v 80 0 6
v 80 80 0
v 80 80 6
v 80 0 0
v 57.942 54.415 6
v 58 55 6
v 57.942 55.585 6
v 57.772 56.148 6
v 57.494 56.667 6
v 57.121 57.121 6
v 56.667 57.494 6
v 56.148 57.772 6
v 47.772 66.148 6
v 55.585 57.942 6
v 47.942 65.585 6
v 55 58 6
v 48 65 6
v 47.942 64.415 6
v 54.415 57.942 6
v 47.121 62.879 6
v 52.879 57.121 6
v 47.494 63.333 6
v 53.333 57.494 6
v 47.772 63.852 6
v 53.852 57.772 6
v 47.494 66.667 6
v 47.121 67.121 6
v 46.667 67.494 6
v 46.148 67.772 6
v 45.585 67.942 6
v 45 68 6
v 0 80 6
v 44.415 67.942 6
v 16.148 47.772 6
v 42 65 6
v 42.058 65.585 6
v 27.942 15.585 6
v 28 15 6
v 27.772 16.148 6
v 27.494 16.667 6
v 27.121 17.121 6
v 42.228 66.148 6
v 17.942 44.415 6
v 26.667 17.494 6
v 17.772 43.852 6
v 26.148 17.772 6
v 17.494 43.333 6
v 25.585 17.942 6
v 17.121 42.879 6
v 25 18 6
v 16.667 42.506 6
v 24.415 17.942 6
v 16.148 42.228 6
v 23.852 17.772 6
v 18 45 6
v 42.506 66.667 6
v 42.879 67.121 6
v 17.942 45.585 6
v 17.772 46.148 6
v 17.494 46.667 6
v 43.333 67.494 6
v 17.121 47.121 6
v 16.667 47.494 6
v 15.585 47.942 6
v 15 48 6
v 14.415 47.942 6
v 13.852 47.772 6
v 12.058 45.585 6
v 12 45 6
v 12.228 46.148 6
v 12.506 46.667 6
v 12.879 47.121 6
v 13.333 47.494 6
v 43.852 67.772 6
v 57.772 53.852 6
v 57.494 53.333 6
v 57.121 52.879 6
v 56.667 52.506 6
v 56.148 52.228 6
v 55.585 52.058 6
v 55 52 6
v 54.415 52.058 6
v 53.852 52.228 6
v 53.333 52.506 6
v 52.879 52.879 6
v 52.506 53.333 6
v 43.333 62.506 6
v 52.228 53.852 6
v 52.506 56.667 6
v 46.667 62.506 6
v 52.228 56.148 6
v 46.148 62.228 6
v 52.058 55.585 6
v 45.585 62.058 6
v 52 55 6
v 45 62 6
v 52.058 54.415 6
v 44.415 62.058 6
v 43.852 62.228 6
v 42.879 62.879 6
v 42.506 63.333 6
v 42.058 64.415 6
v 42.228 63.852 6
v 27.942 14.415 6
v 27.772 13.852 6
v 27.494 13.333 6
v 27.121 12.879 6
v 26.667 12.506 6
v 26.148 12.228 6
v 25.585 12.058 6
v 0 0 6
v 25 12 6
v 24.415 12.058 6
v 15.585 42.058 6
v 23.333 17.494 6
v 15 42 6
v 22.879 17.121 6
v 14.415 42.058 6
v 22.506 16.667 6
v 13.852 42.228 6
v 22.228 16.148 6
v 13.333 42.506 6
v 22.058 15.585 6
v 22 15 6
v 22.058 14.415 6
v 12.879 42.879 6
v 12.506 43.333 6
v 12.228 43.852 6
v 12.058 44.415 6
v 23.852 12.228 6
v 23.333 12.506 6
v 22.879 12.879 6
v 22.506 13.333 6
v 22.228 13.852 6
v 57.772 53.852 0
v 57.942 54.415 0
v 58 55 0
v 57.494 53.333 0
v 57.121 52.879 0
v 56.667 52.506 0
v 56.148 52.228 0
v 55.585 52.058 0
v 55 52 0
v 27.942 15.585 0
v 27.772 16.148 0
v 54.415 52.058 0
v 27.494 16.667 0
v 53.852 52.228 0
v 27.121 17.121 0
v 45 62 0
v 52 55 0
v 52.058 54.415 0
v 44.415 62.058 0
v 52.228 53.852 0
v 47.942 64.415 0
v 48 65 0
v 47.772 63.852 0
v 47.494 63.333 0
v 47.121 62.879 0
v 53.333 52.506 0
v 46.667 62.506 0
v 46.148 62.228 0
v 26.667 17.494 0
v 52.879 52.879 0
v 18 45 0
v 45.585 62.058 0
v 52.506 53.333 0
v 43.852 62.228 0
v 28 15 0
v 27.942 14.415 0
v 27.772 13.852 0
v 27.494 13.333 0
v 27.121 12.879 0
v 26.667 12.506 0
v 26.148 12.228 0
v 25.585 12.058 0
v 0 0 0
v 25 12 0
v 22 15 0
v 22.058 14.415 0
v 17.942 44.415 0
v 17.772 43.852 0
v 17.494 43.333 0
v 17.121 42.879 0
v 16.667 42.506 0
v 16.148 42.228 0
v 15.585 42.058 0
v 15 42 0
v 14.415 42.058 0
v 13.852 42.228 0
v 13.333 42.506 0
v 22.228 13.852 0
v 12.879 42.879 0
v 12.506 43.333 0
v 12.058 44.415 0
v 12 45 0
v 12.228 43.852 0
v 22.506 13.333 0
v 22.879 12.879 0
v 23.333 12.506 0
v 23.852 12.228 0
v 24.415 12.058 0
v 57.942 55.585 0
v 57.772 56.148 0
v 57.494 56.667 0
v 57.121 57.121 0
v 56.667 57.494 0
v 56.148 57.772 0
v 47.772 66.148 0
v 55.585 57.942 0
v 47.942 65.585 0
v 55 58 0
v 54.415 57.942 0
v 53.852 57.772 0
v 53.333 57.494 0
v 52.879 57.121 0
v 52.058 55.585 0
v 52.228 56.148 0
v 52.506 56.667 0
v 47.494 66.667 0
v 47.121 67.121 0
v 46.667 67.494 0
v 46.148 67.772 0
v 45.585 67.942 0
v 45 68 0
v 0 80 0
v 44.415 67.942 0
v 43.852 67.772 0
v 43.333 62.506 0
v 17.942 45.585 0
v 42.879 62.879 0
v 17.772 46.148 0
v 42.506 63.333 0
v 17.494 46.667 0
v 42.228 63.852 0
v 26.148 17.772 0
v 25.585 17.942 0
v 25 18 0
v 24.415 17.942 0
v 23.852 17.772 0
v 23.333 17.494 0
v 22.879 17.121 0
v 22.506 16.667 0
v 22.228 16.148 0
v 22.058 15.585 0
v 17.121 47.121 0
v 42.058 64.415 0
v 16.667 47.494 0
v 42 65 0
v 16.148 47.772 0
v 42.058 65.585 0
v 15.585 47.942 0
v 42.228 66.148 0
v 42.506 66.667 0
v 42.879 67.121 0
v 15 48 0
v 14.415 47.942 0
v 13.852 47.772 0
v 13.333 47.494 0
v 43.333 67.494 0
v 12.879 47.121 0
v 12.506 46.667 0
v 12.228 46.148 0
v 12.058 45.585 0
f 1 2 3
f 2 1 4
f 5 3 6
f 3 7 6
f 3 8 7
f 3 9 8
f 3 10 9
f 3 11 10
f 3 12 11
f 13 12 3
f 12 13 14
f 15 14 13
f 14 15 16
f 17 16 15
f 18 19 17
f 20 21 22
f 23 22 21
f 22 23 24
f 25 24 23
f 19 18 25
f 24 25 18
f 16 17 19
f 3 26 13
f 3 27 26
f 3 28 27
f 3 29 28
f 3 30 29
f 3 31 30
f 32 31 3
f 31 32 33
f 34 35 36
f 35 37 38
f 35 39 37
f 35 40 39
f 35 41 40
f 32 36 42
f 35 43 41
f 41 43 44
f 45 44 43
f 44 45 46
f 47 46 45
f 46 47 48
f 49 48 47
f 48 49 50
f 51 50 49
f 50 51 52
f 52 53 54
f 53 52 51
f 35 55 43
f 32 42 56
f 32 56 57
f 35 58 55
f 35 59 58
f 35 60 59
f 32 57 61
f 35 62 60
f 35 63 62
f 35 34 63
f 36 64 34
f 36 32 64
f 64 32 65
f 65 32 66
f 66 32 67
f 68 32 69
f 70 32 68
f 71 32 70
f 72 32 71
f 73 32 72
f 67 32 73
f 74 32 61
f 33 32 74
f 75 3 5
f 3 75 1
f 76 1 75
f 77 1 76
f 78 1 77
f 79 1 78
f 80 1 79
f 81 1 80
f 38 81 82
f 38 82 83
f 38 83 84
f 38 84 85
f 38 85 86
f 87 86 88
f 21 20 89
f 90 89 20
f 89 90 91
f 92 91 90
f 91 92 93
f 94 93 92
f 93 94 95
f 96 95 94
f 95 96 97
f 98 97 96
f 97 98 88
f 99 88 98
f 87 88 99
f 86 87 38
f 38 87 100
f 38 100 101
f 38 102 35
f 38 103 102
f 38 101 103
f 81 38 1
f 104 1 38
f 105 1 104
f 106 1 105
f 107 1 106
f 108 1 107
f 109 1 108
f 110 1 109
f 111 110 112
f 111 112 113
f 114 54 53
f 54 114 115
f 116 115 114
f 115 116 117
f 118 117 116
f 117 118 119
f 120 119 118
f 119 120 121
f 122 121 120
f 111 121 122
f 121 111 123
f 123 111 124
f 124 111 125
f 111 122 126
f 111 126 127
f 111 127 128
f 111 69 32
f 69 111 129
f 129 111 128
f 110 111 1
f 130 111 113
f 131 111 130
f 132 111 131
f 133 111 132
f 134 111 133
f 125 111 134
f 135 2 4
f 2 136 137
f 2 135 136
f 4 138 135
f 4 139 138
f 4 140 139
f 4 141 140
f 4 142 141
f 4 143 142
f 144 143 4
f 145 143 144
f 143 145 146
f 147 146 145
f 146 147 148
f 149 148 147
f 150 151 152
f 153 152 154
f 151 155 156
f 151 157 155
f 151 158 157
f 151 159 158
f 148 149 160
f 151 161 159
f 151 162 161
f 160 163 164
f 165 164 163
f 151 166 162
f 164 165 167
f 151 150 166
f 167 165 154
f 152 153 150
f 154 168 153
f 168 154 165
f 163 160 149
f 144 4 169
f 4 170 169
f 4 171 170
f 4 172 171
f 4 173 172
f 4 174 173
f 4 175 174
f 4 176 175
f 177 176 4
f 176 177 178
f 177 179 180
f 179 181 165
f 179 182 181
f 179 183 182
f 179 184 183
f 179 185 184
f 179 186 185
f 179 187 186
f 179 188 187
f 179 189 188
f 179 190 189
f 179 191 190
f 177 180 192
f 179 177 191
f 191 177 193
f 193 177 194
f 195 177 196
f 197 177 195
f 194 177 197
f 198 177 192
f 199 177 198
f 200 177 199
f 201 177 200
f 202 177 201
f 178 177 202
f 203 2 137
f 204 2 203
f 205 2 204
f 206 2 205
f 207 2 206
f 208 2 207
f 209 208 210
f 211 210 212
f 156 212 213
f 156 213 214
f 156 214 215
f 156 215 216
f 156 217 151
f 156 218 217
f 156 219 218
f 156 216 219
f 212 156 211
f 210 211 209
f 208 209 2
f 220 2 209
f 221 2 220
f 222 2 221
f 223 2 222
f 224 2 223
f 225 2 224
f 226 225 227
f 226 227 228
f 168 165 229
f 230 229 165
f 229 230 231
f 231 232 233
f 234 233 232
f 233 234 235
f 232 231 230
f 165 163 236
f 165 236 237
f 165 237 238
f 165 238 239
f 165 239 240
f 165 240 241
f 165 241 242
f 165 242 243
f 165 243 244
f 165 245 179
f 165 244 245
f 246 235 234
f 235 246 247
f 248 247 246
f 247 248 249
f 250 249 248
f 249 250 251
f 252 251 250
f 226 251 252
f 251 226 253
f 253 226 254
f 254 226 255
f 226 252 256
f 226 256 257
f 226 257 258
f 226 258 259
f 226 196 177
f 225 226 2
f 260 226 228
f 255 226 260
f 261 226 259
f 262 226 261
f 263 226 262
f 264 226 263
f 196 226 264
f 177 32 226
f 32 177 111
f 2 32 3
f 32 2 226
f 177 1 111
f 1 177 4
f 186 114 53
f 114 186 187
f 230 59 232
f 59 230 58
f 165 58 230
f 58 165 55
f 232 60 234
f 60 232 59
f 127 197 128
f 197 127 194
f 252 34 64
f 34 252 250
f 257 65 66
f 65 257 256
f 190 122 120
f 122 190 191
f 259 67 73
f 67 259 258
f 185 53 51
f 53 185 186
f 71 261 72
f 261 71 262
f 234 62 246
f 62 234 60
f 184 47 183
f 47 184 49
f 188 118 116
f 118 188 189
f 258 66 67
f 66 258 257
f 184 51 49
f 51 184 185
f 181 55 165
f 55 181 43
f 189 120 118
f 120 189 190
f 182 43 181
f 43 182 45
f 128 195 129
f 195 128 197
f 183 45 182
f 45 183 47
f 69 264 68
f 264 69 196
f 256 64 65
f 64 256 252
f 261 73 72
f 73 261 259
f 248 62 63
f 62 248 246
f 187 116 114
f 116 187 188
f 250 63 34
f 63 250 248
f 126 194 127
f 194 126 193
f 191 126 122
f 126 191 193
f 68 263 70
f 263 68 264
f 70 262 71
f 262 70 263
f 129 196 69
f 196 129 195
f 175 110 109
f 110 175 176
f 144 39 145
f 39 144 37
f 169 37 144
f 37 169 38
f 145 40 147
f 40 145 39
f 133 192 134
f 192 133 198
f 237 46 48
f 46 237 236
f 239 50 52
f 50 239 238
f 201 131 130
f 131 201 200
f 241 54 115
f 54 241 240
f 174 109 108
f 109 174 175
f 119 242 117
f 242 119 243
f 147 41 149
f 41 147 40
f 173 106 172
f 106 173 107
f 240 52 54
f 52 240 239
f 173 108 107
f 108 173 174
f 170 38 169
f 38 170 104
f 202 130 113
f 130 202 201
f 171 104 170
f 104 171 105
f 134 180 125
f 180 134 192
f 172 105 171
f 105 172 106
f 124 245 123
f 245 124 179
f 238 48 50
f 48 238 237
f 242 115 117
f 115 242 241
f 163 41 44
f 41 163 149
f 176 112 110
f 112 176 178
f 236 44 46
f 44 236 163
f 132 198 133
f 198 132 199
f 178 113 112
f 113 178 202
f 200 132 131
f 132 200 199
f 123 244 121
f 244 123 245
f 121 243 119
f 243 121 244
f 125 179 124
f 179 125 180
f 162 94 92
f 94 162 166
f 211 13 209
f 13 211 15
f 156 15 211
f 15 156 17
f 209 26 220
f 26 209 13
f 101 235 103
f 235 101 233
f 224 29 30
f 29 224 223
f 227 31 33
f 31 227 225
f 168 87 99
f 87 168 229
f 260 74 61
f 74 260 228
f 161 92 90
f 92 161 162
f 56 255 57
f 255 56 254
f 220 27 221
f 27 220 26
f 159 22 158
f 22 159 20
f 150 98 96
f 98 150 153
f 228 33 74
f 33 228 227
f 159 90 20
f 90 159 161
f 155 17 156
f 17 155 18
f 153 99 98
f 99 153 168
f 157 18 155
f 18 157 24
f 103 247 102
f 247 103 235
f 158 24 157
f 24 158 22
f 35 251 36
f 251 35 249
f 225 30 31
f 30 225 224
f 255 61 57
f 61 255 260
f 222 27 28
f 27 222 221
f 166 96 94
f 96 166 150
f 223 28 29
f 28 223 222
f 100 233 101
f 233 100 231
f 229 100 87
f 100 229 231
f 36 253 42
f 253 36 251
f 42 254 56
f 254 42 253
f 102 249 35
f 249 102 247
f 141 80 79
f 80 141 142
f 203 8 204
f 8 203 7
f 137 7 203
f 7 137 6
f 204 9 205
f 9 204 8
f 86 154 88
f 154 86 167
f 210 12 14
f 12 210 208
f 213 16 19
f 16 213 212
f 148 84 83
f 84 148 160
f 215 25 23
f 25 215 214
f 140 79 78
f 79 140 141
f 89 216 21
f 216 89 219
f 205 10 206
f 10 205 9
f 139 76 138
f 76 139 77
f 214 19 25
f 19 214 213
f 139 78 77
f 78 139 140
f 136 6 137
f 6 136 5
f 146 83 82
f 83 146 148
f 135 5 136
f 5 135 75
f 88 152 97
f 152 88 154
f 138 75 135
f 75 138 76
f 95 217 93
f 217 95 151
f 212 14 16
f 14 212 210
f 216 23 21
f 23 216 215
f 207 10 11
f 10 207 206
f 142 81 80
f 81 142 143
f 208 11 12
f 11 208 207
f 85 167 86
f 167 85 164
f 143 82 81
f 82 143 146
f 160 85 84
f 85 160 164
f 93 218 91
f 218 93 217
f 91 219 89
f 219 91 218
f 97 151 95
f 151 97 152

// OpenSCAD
$fn = 32;

// ----------------------------------------------------------------------
// Hole field: plate with holes at given coordinates
// ----------------------------------------------------------------------

// --- parameters (mm) ---
plate_l = 80;             // plate length, X
plate_w = 80;             // plate width, Y
plate_t = 6;              // plate thickness, Z
hole_d = 6;               // hole diameter

difference() {
  cube([plate_l, plate_w, plate_t]);
  translate([15, 45, -1]) cylinder(h = plate_t + 2, d = hole_d);
  translate([25, 15, -1]) cylinder(h = plate_t + 2, d = hole_d);
  translate([45, 65, -1]) cylinder(h = plate_t + 2, d = hole_d);
  translate([55, 55, -1]) cylinder(h = plate_t + 2, d = hole_d);
}
